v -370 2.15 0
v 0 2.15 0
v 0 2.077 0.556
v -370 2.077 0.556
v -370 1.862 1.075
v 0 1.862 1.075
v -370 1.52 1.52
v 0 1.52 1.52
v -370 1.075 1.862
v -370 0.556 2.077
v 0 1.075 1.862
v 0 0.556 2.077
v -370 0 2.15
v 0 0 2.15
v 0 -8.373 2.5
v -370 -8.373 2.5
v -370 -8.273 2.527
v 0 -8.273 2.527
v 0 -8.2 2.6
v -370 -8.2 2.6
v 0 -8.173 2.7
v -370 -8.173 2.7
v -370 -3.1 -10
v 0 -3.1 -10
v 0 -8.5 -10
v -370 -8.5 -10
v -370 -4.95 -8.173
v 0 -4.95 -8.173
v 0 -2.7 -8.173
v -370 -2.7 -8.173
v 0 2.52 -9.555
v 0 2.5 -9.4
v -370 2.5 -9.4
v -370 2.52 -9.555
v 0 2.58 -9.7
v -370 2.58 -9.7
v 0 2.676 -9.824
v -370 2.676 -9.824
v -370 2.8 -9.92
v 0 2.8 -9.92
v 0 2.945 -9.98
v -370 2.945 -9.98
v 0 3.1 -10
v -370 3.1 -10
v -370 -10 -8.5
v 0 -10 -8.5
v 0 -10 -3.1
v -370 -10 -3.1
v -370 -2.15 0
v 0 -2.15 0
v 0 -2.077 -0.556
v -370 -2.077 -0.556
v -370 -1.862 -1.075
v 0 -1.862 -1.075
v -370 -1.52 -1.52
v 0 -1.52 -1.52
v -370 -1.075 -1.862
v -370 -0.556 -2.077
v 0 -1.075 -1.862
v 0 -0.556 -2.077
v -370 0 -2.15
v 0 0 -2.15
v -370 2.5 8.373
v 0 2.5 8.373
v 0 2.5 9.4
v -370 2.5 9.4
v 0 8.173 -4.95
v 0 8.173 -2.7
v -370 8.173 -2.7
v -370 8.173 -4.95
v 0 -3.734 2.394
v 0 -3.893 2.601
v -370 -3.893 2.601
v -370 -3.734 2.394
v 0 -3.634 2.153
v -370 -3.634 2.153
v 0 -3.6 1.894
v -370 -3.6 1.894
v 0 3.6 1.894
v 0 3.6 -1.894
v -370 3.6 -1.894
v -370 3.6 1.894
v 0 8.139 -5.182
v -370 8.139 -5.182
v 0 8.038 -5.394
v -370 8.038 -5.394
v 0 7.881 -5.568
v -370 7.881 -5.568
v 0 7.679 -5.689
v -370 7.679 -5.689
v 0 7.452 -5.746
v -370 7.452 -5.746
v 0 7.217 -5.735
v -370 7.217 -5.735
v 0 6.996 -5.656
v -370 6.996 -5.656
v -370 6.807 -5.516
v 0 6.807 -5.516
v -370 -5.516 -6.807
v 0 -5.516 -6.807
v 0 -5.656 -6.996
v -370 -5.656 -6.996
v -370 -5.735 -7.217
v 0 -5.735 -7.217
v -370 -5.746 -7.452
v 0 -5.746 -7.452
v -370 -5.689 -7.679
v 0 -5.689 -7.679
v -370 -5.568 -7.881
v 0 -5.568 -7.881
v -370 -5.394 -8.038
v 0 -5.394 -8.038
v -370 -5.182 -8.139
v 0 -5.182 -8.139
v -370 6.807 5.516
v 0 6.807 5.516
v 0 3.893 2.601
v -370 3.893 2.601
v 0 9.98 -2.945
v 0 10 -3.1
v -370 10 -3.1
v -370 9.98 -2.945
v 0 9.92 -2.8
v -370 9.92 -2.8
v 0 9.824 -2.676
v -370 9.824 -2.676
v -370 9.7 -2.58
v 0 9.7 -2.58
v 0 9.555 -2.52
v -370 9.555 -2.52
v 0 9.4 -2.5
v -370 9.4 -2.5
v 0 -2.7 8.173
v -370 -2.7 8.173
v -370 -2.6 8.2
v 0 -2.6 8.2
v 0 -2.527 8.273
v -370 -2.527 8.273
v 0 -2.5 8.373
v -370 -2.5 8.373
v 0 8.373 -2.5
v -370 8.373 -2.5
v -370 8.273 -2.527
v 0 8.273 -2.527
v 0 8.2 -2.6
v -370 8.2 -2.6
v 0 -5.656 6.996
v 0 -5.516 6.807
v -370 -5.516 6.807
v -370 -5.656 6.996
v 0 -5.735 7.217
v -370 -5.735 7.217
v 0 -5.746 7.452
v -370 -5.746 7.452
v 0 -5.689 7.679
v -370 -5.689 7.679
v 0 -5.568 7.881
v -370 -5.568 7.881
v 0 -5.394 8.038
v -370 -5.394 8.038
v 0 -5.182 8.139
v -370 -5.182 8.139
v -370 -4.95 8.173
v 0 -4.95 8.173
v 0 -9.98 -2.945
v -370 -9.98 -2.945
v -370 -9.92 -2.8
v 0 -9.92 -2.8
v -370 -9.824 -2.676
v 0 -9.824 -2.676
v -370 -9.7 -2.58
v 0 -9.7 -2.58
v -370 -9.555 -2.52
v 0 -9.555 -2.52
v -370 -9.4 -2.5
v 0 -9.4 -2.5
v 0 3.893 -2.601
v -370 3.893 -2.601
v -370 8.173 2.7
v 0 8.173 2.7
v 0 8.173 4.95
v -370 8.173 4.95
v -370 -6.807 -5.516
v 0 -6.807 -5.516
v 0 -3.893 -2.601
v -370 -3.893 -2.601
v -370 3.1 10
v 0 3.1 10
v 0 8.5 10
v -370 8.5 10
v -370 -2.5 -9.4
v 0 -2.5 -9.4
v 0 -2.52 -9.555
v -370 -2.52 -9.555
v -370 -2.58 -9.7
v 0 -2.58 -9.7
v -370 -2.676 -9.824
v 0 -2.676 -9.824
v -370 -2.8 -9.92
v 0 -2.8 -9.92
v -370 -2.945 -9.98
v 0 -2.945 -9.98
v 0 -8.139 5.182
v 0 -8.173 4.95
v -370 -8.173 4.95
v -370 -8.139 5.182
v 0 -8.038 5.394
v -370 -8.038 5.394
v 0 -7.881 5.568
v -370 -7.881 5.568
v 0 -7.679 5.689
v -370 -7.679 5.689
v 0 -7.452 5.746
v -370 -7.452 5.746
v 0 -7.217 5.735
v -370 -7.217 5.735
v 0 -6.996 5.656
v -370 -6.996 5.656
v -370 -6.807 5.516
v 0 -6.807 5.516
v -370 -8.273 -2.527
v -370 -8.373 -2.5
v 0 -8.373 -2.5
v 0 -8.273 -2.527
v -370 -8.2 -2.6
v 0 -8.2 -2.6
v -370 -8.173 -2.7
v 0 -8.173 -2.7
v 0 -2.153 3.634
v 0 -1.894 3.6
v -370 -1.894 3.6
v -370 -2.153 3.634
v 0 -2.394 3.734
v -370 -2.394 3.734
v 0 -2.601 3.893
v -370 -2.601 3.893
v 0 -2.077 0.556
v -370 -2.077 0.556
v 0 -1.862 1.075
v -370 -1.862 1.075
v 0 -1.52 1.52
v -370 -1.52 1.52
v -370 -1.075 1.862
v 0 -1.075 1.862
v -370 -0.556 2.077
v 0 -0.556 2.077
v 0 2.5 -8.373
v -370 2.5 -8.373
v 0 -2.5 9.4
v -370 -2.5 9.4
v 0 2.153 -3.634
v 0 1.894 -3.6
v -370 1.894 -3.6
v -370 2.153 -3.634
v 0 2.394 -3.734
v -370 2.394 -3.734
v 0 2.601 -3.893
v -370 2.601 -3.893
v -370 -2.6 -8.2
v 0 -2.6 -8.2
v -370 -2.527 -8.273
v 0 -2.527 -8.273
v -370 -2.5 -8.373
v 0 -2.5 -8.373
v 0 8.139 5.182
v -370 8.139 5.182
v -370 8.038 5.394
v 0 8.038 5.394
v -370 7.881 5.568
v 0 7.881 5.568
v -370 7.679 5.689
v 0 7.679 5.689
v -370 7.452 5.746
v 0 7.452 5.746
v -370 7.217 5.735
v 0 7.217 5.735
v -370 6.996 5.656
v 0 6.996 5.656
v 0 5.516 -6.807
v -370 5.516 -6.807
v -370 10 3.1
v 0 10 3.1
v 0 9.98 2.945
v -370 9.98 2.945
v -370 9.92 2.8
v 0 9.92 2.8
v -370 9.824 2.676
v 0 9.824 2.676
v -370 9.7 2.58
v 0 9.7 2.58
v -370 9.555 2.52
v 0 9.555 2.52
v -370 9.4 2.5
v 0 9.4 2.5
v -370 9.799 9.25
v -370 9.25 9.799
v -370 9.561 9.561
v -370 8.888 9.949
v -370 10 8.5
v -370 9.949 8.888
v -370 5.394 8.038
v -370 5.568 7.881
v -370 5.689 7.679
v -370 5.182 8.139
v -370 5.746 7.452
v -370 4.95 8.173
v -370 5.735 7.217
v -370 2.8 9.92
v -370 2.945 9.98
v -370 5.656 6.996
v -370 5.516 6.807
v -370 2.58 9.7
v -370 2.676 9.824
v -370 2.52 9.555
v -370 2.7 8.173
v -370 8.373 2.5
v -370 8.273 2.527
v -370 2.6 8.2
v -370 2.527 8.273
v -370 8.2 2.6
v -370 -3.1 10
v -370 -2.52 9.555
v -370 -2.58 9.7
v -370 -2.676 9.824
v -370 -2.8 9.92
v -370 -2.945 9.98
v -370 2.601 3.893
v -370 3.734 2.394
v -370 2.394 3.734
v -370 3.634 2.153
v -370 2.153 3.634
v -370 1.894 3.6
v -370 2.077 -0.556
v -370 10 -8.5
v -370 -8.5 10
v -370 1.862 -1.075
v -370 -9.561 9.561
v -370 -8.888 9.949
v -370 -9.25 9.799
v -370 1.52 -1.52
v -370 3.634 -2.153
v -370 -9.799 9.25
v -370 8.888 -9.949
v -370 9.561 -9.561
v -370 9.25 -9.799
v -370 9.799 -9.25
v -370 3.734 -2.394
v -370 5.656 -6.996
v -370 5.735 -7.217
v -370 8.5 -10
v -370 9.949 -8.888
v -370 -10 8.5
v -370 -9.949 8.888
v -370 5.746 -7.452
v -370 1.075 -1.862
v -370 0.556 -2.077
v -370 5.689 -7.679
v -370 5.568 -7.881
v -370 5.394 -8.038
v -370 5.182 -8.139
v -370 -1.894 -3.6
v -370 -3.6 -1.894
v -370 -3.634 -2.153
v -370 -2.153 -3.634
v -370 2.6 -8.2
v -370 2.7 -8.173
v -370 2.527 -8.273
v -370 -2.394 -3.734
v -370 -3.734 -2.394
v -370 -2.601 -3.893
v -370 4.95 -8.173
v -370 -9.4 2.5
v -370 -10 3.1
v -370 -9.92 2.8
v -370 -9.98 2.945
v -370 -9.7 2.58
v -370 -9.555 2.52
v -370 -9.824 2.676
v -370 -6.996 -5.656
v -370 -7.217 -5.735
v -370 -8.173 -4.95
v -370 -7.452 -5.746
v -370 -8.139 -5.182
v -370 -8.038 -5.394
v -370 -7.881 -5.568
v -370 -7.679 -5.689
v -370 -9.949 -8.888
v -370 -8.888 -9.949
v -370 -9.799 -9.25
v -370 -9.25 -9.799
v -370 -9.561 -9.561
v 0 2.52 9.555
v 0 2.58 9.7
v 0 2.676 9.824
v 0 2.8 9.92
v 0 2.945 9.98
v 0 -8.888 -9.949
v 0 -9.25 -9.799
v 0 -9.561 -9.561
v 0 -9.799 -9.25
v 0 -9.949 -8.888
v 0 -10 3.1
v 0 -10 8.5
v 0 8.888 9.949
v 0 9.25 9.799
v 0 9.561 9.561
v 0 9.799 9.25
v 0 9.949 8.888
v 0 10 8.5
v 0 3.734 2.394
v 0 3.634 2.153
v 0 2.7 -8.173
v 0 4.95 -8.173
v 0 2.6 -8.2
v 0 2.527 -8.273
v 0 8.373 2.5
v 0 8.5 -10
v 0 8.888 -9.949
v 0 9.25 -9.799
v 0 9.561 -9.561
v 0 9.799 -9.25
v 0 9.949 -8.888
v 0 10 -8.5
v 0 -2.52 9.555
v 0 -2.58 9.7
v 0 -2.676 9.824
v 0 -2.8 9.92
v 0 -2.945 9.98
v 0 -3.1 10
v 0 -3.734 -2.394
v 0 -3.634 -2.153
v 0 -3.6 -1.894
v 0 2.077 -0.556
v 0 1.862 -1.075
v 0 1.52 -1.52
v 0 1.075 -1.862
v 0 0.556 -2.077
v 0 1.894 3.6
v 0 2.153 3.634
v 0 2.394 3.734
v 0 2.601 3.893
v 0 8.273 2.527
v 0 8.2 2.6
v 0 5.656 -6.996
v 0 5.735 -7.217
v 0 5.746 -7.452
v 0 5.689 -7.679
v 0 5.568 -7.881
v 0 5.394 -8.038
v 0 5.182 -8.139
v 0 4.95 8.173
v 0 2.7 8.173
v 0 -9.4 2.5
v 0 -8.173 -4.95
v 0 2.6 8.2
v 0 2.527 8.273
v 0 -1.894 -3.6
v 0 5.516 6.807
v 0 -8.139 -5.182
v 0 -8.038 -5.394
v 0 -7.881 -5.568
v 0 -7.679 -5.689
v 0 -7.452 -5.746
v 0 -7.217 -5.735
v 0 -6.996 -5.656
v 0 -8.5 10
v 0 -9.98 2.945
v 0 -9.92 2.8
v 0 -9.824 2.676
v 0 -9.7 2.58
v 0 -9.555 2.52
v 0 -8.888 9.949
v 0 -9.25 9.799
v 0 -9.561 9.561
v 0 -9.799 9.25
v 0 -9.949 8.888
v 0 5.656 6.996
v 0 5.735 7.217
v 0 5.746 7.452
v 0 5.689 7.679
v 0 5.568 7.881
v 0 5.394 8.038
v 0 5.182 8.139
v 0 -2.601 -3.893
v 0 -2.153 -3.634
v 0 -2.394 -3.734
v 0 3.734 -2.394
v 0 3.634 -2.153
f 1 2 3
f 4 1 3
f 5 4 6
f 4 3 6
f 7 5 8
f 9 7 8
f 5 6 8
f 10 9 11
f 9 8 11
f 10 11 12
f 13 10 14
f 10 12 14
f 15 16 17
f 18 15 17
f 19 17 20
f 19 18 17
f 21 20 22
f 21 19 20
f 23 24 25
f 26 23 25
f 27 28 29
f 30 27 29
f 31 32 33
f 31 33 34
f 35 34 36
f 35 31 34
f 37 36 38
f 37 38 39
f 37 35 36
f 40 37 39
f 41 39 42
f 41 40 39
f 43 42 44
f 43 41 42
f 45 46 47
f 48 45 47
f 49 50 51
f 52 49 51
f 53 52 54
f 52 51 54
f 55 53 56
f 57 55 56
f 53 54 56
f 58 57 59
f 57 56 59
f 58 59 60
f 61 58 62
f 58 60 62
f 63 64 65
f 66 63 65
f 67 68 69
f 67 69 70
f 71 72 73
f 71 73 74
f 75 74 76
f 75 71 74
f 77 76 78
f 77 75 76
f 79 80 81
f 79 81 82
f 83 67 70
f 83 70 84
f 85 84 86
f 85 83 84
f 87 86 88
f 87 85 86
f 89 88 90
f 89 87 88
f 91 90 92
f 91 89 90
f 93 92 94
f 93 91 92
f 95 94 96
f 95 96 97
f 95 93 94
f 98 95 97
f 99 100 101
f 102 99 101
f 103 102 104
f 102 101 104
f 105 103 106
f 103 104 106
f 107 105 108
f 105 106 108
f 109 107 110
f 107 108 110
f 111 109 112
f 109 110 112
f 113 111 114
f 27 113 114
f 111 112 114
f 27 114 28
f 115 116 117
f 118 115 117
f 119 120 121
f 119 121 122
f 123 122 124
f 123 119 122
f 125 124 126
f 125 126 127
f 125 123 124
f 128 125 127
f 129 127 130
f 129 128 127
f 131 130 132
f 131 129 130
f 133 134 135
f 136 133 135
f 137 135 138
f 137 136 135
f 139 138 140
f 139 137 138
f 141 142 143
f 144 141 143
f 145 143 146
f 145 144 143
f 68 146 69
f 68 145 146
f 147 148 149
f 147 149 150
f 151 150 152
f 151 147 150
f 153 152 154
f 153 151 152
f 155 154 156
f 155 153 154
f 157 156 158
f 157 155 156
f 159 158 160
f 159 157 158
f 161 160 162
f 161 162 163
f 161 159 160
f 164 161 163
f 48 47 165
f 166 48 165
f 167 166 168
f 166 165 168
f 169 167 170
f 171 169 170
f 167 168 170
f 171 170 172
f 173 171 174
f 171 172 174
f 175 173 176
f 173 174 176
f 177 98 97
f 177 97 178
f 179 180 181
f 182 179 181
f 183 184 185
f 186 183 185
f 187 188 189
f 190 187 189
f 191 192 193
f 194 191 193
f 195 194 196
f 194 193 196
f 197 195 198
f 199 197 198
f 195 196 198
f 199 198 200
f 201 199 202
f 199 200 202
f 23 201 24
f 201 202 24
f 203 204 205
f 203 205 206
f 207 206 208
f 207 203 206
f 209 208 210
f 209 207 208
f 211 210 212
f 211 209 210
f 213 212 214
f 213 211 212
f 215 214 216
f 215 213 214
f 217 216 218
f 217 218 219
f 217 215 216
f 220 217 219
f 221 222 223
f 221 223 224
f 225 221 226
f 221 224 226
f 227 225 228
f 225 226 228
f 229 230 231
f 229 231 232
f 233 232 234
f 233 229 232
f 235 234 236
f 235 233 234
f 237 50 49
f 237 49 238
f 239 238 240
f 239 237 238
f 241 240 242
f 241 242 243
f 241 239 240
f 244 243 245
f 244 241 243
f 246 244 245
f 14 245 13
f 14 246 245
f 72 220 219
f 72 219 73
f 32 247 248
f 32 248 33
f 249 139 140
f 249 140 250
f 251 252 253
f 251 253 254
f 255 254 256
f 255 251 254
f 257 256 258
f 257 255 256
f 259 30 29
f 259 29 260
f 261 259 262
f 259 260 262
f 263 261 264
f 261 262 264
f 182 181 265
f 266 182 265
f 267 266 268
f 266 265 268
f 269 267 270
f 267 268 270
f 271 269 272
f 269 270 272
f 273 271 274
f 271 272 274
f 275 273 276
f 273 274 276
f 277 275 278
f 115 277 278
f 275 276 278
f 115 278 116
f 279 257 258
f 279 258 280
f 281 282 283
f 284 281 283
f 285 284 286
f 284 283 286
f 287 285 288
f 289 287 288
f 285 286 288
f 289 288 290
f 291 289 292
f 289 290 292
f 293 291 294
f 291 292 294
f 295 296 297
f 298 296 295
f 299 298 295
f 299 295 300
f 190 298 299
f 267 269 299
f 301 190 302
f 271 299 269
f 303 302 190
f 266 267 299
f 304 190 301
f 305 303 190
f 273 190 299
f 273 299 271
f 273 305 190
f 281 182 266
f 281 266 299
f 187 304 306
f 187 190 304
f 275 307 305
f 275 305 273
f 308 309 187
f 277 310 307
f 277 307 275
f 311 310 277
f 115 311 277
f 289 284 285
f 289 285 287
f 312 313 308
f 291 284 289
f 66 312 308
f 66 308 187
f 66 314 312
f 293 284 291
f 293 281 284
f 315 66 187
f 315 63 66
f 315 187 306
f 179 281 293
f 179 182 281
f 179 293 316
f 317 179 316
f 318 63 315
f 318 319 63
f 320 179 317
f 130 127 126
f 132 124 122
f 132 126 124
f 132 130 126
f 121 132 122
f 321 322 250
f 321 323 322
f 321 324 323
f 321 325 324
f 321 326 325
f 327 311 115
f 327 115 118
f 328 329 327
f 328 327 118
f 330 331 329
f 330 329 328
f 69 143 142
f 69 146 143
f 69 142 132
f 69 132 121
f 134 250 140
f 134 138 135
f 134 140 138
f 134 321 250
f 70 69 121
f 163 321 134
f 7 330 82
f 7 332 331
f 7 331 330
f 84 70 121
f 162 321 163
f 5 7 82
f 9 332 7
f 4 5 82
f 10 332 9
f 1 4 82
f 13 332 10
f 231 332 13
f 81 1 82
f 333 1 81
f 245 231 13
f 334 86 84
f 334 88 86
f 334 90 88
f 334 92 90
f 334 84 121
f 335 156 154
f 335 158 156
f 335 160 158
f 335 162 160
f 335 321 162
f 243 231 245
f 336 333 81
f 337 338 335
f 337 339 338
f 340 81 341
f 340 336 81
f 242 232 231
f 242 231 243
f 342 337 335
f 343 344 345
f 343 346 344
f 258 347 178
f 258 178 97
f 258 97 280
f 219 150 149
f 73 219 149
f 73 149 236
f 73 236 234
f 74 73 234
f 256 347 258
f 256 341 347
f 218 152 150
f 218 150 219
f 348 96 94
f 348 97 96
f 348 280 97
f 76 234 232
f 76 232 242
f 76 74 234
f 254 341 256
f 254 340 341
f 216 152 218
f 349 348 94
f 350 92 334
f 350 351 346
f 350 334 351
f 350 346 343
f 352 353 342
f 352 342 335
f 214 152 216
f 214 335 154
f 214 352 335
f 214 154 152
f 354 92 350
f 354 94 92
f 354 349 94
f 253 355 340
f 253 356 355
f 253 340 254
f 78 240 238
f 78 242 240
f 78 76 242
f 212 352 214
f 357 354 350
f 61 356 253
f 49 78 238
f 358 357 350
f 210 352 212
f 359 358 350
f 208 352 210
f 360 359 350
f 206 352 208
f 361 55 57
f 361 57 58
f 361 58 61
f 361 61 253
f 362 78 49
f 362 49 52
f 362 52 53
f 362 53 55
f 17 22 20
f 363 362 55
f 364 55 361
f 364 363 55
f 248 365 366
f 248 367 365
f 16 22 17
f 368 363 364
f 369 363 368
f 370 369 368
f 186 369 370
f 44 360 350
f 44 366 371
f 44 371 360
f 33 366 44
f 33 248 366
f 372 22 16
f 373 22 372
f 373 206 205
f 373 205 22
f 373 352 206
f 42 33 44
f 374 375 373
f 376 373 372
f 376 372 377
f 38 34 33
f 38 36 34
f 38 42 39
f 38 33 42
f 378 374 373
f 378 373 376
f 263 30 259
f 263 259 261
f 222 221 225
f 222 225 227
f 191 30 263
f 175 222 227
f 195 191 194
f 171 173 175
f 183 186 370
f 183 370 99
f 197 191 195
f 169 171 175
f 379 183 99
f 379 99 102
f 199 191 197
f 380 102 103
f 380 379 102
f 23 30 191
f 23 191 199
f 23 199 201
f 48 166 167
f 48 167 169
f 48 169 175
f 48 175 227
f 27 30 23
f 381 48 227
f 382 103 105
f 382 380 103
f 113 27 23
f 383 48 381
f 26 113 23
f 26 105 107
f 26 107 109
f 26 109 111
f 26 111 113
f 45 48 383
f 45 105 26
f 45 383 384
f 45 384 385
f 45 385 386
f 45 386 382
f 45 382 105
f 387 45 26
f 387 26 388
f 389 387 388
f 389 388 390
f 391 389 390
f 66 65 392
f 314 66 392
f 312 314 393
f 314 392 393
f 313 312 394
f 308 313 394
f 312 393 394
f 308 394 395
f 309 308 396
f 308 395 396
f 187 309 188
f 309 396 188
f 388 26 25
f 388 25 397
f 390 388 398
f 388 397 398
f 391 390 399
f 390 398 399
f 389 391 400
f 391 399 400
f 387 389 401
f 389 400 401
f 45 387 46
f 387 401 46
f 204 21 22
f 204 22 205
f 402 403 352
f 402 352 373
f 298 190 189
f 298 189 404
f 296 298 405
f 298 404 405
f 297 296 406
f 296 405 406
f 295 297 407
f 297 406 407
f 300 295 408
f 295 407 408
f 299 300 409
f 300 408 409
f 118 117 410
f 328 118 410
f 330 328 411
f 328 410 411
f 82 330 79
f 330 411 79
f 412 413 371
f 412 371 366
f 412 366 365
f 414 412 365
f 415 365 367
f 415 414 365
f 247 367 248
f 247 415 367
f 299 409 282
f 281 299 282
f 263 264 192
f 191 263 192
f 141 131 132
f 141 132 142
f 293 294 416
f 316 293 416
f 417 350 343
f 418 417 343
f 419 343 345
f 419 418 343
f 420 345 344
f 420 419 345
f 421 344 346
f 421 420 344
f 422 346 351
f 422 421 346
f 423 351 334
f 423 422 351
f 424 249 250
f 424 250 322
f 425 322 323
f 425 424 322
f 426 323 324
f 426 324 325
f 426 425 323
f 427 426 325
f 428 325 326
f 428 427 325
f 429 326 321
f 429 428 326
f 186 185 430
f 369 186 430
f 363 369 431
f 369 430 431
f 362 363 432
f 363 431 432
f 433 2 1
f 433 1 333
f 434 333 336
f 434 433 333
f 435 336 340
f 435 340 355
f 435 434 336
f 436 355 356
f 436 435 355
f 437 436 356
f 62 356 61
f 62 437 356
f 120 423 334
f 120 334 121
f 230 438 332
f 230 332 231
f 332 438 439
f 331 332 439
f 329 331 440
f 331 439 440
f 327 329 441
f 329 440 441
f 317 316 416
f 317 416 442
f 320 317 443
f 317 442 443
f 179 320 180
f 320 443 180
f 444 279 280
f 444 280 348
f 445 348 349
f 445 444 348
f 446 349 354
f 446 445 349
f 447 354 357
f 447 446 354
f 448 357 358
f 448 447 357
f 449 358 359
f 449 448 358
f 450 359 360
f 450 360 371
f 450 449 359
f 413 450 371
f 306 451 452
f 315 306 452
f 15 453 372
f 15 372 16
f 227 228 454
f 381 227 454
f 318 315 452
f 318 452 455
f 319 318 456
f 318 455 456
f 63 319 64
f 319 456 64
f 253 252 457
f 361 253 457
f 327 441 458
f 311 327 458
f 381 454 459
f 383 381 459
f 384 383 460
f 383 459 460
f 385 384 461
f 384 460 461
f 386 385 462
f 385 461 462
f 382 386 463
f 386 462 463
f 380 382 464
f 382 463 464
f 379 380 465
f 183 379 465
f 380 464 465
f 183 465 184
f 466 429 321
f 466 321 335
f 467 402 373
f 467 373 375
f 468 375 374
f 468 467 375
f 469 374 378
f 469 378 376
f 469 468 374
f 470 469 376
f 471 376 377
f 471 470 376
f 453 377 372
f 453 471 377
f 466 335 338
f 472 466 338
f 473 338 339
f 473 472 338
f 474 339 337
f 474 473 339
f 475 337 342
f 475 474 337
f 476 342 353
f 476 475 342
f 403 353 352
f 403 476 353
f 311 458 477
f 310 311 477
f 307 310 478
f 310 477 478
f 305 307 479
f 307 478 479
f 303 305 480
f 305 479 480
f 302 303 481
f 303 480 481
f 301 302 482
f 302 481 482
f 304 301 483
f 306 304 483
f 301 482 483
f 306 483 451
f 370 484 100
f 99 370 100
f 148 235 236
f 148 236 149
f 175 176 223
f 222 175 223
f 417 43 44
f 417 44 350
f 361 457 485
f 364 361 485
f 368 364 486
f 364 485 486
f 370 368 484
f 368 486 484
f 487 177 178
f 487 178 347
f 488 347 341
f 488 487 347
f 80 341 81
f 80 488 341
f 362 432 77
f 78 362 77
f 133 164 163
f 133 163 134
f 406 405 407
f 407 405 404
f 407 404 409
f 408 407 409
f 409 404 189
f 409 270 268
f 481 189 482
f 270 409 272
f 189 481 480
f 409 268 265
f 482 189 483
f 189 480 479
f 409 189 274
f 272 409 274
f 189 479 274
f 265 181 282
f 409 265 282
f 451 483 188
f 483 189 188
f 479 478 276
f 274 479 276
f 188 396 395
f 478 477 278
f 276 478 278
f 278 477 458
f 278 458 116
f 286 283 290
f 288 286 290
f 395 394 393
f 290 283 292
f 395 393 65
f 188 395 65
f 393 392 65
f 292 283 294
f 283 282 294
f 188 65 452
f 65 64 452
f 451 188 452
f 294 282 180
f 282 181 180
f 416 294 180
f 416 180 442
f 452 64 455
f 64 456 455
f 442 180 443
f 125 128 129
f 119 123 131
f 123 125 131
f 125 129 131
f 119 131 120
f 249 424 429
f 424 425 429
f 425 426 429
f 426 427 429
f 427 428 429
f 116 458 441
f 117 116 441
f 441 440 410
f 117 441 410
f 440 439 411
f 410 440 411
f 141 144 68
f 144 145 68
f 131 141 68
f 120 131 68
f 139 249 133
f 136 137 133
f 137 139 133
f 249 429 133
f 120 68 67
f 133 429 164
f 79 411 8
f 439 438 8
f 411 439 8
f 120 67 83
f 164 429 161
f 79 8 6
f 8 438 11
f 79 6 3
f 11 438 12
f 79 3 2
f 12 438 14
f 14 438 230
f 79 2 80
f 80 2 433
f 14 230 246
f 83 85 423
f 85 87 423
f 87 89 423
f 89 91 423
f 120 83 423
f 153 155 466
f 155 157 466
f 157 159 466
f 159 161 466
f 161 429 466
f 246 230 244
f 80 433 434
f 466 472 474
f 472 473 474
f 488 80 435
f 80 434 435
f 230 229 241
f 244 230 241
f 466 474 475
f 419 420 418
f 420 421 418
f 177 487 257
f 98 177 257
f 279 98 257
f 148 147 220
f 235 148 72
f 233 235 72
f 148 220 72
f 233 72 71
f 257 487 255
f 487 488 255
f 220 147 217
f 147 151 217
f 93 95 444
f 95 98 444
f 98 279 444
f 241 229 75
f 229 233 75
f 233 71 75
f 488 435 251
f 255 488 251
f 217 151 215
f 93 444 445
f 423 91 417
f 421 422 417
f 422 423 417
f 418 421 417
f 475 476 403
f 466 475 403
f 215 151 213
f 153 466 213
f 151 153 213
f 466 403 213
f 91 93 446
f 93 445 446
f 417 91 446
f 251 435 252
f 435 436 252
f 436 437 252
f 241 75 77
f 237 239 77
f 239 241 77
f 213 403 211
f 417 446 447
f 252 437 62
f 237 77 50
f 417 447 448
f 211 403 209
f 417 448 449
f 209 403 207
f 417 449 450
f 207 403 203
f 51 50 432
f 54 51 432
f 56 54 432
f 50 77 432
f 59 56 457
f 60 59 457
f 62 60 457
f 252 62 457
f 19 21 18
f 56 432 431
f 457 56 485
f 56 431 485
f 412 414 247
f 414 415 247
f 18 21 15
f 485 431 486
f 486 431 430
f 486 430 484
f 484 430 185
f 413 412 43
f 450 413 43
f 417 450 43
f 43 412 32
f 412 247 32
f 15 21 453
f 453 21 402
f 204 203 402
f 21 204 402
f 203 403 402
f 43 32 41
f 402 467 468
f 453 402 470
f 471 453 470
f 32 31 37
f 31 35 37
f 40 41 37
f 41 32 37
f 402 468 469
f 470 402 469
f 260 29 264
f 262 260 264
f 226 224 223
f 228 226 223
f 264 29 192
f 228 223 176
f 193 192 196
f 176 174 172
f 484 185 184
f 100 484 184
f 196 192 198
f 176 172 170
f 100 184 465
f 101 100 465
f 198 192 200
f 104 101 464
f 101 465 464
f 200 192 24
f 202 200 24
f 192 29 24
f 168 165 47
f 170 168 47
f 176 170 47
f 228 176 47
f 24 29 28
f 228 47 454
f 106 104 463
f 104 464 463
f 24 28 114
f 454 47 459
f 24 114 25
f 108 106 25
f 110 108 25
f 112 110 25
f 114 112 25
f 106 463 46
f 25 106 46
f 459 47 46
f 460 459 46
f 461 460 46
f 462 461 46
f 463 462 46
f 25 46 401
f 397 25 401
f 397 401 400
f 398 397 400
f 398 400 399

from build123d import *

# Parameters (mm, degrees)
BOSS_EXTRUDE1_DEPTH = 370


with BuildPart() as part:
    # Sketch3 → Boss-Extrude1 (new body)
    with BuildSketch(Plane(origin=(0, 0, 0), x_dir=(0, 0, -1), z_dir=(1, 0, 0))):
        with BuildLine():
            Line((-5.515685425, 6.807463915), (-2.601114729, 3.892893219))
            ThreePointArc((-2.601114729, 3.892893219), (-2.27669138, 3.676120467), (-1.894007948, 3.6))
            Line((-1.894007948, 3.6), (0, 3.6))
            Line((0, 3.6), (0, 2.15))
            ThreePointArc((0, 2.15), (-1.52027958, 1.52027958), (-2.15, 0))
            Line((-2.15, 0), (-3.6, 0))
            Line((-3.6, 0), (-3.6, 1.894007948))
            ThreePointArc((-3.6, 1.894007948), (-3.676120467, 2.27669138), (-3.892893219, 2.601114729))
            Line((-3.892893219, 2.601114729), (-6.807463915, 5.515685425))
            ThreePointArc((-6.807463915, 5.515685425), (-7.679296086, 5.689103626), (-8.17314934, 4.95))
            Line((-8.17314934, 4.95), (-8.17314934, 2.699999897))
            ThreePointArc((-8.17314934, 2.699999897), (-8.23172802, 2.558578607), (-8.37314934, 2.5))
            Line((-8.37314934, 2.5), (-9.4, 2.5))
            ThreePointArc((-9.4, 2.5), (-9.824264069, 2.675735931), (-10, 3.1))
            Line((-10, 3.1), (-10, 8.5))
            ThreePointArc((-10, 8.5), (-9.560660172, 9.560660172), (-8.5, 10))
            Line((-8.5, 10), (-3.1, 10))
            ThreePointArc((-3.1, 10), (-2.675735931, 9.824264069), (-2.5, 9.4))
            Line((-2.5, 9.4), (-2.5, 8.37314934))
            ThreePointArc((-2.5, 8.37314934), (-2.558578607, 8.23172802), (-2.699999897, 8.17314934))
            Line((-2.699999897, 8.17314934), (-4.95, 8.17314934))
            ThreePointArc((-4.95, 8.17314934), (-5.689103626, 7.679296086), (-5.515685425, 6.807463915))
        make_face()
    extrude(amount=-BOSS_EXTRUDE1_DEPTH)

    # Mirror1: part across plane


with BuildPart() as part_1:
    add(part.part)
    add(part.part.mirror(Plane.ZX))

    # Mirror2: part across plane


with BuildPart() as part_2:
    add(part_1.part)
    add(part_1.part.mirror(Plane.XY))


solid = part_2.part
